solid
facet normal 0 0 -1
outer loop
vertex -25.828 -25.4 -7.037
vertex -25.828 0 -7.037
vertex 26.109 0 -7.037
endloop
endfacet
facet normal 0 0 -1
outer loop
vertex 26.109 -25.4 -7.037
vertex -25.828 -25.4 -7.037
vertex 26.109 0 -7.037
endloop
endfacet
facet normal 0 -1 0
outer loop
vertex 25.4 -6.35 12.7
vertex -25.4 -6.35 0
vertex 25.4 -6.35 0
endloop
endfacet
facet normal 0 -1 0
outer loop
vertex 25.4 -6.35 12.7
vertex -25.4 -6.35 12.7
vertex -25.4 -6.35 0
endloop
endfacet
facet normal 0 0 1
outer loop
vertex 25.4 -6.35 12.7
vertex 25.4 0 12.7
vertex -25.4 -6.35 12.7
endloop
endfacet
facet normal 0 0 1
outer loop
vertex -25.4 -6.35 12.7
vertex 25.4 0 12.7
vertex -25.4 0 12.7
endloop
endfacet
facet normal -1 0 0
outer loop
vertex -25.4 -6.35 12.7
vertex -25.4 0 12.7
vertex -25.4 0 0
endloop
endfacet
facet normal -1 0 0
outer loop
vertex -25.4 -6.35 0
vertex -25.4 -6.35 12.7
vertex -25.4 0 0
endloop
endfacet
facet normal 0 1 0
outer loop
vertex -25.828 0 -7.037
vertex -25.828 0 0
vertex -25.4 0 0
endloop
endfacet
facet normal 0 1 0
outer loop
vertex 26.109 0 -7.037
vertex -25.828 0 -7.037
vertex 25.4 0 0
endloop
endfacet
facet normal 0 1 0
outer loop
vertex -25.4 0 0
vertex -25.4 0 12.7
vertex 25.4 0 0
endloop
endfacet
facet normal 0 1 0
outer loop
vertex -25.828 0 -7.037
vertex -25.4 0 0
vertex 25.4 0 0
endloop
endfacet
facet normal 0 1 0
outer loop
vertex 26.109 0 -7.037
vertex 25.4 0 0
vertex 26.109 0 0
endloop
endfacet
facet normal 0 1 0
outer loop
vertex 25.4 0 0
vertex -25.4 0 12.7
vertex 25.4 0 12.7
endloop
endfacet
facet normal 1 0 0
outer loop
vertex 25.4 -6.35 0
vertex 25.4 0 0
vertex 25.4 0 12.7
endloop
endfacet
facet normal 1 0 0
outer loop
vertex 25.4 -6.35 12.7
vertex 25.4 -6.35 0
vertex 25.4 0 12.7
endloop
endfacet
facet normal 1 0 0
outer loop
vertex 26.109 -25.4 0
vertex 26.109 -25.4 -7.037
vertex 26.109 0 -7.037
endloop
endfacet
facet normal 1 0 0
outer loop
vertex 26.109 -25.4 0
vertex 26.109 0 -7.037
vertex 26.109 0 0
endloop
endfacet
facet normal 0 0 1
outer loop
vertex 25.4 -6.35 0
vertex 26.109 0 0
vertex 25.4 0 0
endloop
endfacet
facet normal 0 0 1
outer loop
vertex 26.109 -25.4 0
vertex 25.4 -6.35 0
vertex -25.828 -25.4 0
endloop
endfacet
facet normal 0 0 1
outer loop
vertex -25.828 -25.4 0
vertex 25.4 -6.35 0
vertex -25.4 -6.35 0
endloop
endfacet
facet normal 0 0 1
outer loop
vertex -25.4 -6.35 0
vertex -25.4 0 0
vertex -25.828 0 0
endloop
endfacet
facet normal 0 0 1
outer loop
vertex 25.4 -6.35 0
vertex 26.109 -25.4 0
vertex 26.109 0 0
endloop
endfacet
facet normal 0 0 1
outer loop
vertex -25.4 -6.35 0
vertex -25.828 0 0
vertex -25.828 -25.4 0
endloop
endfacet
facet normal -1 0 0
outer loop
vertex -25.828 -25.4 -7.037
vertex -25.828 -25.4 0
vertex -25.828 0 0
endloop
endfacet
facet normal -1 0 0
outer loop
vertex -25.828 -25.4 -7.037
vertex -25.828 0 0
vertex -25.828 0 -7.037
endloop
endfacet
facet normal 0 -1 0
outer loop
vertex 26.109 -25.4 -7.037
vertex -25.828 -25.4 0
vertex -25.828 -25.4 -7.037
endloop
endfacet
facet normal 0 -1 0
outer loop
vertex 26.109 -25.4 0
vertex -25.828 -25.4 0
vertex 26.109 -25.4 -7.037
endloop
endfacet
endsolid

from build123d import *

# Parameters (mm, degrees)
F1_DEPTH = 6.35
F3_DEPTH = 25.4
F4_DEPTH = 25.4


with BuildPart() as f1:
    # F0 (on Front) → F1 (new body)
    with BuildSketch(Plane.XZ):
        Polygon((-25.4, 0), (0, 0), (25.4, 0), (25.4, 12.7), (-25.4, 12.7), align=None)
    extrude(amount=F1_DEPTH)

    # F2 (on Front) → F3 (join)
    with BuildSketch(Plane.XZ):
        Polygon((26.108526, -7.03671), (26.108526, 0), (0, 0), (-25.82779, 0), (-25.82779, -7.03671), align=None)
    extrude(amount=F3_DEPTH)

    # F2 (on Front) → F4 (join)
    with BuildSketch(Plane.XZ):
        Polygon((26.108526, -7.03671), (26.108526, 0), (0, 0), (-25.82779, 0), (-25.82779, -7.03671), align=None)
    extrude(amount=F4_DEPTH)


solid = f1.part
